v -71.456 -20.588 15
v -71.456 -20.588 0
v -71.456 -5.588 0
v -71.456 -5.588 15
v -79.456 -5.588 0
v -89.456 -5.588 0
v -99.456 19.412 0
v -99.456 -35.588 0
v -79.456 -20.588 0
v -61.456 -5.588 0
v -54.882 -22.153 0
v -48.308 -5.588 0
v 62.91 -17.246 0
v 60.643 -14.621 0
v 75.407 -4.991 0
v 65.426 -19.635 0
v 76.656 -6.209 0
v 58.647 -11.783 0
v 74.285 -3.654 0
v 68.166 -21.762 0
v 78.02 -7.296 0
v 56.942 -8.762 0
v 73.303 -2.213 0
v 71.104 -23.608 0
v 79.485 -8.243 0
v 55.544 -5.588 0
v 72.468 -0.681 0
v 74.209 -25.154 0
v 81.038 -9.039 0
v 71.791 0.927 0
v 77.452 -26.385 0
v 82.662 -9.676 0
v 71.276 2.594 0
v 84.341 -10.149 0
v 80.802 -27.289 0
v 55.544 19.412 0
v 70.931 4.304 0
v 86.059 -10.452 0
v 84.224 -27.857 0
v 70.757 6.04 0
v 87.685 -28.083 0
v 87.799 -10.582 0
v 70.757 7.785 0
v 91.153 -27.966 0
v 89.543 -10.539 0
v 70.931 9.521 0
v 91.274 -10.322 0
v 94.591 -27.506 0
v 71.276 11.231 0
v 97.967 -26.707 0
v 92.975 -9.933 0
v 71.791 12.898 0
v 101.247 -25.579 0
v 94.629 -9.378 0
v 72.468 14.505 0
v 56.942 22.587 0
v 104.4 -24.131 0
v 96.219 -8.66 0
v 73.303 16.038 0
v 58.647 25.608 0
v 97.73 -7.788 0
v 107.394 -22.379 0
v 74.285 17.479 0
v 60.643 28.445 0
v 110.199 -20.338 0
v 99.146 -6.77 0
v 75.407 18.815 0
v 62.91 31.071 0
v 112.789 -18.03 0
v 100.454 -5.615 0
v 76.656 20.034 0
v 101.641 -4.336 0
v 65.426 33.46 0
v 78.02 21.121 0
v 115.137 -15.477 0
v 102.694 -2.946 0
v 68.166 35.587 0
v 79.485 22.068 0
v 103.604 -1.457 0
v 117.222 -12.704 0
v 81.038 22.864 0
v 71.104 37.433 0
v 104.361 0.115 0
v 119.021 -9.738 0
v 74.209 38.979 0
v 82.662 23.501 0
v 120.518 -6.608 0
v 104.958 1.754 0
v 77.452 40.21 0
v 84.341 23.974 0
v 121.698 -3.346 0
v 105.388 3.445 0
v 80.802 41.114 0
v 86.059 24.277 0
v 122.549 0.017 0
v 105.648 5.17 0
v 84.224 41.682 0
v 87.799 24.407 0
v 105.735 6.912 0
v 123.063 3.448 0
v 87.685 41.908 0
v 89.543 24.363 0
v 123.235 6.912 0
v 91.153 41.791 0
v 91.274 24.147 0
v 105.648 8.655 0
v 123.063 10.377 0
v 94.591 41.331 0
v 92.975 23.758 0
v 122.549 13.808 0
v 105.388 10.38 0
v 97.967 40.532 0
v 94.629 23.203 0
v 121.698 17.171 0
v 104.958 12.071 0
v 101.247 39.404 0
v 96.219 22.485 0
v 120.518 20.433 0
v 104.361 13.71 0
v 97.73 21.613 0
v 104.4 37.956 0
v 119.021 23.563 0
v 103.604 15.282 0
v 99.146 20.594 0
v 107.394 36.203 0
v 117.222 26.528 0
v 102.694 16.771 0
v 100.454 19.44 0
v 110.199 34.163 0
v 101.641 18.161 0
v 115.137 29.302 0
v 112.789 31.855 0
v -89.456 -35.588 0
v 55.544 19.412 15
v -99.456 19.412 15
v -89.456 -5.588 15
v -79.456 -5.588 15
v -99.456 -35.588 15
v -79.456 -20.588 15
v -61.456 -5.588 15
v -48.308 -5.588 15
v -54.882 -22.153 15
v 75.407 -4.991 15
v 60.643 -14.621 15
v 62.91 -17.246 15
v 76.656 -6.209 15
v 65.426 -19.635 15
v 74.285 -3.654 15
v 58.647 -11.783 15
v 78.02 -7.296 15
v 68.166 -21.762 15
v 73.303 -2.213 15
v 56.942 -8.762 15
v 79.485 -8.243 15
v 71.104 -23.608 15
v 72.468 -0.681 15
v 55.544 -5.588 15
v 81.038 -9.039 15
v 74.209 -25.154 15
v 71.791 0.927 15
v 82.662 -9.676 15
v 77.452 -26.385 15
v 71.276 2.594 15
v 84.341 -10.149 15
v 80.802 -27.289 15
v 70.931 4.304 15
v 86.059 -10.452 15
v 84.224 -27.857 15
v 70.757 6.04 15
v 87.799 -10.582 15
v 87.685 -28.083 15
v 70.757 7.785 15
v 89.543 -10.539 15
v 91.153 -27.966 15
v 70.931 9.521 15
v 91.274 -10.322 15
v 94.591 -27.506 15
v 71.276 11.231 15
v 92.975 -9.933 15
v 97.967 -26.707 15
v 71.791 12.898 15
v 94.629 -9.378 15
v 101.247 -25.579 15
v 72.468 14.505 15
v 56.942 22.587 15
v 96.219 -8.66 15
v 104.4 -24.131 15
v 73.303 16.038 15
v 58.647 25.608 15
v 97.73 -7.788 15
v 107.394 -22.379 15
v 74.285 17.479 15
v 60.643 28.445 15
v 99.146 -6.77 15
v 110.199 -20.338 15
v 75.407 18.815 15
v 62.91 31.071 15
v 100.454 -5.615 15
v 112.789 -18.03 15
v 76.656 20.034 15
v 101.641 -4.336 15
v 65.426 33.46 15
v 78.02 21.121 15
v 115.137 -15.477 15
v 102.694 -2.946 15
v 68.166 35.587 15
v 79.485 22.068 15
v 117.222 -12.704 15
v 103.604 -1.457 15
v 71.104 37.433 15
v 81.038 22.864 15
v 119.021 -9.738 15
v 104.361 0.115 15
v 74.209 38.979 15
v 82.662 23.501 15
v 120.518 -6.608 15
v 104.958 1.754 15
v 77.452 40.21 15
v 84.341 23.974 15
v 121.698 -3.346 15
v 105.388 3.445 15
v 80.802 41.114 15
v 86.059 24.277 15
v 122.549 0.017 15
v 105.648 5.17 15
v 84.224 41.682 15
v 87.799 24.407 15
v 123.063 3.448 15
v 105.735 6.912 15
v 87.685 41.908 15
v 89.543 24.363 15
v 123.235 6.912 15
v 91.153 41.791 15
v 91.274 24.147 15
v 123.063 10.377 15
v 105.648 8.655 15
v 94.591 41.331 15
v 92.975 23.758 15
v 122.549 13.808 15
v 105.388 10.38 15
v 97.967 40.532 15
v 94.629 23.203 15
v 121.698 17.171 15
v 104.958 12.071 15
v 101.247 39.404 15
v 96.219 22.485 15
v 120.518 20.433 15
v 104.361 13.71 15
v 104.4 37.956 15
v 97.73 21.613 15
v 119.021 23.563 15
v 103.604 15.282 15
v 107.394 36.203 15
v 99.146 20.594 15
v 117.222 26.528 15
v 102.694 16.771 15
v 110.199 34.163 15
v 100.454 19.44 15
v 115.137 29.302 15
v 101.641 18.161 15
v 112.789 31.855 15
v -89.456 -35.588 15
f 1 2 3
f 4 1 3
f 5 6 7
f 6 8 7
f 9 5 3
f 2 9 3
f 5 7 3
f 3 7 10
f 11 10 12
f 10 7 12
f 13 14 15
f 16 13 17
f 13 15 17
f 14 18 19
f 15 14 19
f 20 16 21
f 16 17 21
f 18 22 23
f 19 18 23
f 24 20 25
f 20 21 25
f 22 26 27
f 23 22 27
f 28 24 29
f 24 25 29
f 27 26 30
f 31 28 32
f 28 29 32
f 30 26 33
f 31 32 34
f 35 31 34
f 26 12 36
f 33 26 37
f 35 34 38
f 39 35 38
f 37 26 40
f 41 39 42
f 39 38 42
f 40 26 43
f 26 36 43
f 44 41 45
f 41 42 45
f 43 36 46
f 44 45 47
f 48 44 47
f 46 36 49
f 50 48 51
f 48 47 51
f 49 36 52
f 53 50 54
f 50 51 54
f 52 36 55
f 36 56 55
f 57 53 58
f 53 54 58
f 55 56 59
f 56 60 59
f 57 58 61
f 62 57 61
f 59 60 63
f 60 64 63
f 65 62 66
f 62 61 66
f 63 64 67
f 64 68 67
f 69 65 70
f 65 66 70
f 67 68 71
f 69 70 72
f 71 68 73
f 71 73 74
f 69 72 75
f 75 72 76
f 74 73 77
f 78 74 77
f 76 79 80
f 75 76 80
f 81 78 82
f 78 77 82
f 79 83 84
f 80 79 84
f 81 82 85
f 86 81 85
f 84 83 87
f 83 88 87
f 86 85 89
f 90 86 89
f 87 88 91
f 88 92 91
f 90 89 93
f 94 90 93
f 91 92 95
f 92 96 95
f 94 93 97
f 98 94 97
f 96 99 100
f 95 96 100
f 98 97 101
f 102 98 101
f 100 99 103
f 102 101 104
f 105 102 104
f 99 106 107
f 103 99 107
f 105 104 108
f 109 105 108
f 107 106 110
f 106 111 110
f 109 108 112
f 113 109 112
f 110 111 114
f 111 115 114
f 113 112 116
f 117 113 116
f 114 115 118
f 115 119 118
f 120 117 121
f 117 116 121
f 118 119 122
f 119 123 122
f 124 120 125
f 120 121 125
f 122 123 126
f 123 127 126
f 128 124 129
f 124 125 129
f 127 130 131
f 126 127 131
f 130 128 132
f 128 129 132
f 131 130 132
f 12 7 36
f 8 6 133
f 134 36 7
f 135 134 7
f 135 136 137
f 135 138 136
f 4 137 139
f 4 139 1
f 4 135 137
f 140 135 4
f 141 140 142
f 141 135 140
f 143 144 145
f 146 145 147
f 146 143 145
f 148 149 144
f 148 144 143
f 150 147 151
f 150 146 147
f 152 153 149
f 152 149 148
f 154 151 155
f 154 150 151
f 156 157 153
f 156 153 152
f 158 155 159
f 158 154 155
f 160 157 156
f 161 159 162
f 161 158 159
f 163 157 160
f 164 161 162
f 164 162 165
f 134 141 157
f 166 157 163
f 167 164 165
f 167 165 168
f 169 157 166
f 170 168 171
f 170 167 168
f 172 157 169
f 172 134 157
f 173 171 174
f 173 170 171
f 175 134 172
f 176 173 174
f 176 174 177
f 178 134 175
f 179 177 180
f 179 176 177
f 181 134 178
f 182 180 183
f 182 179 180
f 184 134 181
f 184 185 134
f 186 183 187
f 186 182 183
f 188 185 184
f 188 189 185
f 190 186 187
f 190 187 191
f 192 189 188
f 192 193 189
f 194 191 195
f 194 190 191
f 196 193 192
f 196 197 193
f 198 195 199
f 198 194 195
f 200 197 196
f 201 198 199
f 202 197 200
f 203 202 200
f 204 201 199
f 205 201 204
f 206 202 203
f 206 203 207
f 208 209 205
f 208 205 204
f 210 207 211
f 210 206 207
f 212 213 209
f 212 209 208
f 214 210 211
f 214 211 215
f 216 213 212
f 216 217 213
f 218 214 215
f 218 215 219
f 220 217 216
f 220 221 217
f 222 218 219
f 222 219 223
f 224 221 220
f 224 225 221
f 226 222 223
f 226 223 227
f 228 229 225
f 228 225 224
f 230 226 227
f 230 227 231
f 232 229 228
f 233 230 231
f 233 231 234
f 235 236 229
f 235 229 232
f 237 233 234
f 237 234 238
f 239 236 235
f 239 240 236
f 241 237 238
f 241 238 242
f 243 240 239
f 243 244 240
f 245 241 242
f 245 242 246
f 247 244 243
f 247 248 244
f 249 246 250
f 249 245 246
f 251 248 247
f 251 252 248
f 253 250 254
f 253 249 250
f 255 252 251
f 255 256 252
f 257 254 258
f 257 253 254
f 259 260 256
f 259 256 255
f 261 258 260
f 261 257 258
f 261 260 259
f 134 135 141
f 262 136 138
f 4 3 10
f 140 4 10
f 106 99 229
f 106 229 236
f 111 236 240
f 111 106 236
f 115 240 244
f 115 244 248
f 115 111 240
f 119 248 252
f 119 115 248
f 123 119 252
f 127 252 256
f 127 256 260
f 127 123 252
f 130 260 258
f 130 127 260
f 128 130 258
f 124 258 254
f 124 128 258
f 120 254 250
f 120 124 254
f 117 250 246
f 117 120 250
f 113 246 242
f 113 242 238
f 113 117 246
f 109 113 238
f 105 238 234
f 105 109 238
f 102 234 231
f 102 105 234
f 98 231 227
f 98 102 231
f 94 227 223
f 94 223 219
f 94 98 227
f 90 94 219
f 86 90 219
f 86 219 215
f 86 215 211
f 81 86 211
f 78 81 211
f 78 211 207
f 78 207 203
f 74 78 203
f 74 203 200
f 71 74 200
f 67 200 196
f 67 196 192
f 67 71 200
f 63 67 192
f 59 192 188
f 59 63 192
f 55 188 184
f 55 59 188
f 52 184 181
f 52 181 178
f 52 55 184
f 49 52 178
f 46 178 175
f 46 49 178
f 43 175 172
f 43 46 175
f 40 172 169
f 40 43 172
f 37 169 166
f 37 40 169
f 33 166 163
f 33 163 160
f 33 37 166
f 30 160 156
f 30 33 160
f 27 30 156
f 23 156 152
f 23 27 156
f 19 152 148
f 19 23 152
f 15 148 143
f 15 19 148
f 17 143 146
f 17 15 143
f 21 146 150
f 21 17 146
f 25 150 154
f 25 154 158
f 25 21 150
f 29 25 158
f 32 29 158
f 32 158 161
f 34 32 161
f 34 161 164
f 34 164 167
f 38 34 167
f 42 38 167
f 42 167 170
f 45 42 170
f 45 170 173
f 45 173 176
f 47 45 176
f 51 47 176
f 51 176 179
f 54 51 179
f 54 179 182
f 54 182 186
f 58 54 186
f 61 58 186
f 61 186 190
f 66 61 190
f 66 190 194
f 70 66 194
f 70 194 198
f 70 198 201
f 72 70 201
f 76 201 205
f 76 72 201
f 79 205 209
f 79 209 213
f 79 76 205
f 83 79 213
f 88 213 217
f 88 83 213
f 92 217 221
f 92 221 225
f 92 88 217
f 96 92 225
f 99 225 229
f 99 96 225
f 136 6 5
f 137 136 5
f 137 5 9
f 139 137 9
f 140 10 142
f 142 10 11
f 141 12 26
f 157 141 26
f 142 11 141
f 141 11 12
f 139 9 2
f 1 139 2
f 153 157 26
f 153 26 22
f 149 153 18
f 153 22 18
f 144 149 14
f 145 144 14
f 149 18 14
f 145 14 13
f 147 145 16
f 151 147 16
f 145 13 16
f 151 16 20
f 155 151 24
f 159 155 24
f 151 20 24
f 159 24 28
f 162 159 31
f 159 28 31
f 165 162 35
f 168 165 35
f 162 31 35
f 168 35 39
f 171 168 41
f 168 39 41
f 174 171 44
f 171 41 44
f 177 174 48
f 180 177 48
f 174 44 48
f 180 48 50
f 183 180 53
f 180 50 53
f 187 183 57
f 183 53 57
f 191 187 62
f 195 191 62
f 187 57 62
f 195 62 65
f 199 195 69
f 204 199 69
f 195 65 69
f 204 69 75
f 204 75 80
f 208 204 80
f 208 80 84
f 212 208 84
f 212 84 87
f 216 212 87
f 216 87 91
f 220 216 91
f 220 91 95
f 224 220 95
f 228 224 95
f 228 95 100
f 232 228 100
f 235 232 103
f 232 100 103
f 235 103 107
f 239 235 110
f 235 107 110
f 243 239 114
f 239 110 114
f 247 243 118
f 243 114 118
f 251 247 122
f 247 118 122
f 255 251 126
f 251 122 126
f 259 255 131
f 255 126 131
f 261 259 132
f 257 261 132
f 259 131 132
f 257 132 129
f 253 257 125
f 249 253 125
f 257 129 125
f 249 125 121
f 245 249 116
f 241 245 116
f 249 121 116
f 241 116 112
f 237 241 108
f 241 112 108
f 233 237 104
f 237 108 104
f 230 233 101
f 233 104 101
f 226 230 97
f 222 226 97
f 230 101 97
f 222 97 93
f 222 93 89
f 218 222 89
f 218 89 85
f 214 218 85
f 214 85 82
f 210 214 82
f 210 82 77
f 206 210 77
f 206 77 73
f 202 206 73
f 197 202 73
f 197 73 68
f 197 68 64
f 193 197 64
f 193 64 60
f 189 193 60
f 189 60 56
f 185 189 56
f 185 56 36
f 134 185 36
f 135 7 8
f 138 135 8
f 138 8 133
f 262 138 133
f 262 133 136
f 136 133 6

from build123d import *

# Parameters (mm, degrees)
F0_R     = 17.5
F1_DEPTH = 15


with BuildPart() as f1:
    # F0 (on Top) → F1 (new body)
    with BuildSketch(Plane.XY):
        with BuildLine():
            Line((55.543554, 19.412428), (-99.456446, 19.412428))
            Line((-99.456446, 19.412428), (-99.456446, -5.587572))
            Line((-99.456446, -5.587572), (-99.456446, -35.587572))
            Line((-99.456446, -35.587572), (-89.456446, -35.587572))
            Line((-89.456446, -35.587572), (-89.456446, -5.587572))
            Line((-89.456446, -5.587572), (-79.456446, -5.587572))
            Line((-79.456446, -5.587572), (-79.456446, -20.587572))
            Line((-79.456446, -20.587572), (-71.456446, -20.587572))
            Line((-71.456446, -20.587572), (-71.456446, -5.587572))
            Line((-71.456446, -5.587572), (-61.456446, -5.587572))
            Line((-61.456446, -5.587572), (-54.882035, -22.152904))
            Line((-54.882035, -22.152904), (-48.307624, -5.587572))
            Line((-48.307624, -5.587572), (55.543554, -5.587572))
            ThreePointArc((55.543554, -5.587572), (123.235296, 6.912428), (55.543554, 19.412428))
        make_face()
        with Locations((88.235296, 6.912428)):
            Circle(F0_R, mode=Mode.SUBTRACT)
    extrude(amount=F1_DEPTH)


solid = f1.part
